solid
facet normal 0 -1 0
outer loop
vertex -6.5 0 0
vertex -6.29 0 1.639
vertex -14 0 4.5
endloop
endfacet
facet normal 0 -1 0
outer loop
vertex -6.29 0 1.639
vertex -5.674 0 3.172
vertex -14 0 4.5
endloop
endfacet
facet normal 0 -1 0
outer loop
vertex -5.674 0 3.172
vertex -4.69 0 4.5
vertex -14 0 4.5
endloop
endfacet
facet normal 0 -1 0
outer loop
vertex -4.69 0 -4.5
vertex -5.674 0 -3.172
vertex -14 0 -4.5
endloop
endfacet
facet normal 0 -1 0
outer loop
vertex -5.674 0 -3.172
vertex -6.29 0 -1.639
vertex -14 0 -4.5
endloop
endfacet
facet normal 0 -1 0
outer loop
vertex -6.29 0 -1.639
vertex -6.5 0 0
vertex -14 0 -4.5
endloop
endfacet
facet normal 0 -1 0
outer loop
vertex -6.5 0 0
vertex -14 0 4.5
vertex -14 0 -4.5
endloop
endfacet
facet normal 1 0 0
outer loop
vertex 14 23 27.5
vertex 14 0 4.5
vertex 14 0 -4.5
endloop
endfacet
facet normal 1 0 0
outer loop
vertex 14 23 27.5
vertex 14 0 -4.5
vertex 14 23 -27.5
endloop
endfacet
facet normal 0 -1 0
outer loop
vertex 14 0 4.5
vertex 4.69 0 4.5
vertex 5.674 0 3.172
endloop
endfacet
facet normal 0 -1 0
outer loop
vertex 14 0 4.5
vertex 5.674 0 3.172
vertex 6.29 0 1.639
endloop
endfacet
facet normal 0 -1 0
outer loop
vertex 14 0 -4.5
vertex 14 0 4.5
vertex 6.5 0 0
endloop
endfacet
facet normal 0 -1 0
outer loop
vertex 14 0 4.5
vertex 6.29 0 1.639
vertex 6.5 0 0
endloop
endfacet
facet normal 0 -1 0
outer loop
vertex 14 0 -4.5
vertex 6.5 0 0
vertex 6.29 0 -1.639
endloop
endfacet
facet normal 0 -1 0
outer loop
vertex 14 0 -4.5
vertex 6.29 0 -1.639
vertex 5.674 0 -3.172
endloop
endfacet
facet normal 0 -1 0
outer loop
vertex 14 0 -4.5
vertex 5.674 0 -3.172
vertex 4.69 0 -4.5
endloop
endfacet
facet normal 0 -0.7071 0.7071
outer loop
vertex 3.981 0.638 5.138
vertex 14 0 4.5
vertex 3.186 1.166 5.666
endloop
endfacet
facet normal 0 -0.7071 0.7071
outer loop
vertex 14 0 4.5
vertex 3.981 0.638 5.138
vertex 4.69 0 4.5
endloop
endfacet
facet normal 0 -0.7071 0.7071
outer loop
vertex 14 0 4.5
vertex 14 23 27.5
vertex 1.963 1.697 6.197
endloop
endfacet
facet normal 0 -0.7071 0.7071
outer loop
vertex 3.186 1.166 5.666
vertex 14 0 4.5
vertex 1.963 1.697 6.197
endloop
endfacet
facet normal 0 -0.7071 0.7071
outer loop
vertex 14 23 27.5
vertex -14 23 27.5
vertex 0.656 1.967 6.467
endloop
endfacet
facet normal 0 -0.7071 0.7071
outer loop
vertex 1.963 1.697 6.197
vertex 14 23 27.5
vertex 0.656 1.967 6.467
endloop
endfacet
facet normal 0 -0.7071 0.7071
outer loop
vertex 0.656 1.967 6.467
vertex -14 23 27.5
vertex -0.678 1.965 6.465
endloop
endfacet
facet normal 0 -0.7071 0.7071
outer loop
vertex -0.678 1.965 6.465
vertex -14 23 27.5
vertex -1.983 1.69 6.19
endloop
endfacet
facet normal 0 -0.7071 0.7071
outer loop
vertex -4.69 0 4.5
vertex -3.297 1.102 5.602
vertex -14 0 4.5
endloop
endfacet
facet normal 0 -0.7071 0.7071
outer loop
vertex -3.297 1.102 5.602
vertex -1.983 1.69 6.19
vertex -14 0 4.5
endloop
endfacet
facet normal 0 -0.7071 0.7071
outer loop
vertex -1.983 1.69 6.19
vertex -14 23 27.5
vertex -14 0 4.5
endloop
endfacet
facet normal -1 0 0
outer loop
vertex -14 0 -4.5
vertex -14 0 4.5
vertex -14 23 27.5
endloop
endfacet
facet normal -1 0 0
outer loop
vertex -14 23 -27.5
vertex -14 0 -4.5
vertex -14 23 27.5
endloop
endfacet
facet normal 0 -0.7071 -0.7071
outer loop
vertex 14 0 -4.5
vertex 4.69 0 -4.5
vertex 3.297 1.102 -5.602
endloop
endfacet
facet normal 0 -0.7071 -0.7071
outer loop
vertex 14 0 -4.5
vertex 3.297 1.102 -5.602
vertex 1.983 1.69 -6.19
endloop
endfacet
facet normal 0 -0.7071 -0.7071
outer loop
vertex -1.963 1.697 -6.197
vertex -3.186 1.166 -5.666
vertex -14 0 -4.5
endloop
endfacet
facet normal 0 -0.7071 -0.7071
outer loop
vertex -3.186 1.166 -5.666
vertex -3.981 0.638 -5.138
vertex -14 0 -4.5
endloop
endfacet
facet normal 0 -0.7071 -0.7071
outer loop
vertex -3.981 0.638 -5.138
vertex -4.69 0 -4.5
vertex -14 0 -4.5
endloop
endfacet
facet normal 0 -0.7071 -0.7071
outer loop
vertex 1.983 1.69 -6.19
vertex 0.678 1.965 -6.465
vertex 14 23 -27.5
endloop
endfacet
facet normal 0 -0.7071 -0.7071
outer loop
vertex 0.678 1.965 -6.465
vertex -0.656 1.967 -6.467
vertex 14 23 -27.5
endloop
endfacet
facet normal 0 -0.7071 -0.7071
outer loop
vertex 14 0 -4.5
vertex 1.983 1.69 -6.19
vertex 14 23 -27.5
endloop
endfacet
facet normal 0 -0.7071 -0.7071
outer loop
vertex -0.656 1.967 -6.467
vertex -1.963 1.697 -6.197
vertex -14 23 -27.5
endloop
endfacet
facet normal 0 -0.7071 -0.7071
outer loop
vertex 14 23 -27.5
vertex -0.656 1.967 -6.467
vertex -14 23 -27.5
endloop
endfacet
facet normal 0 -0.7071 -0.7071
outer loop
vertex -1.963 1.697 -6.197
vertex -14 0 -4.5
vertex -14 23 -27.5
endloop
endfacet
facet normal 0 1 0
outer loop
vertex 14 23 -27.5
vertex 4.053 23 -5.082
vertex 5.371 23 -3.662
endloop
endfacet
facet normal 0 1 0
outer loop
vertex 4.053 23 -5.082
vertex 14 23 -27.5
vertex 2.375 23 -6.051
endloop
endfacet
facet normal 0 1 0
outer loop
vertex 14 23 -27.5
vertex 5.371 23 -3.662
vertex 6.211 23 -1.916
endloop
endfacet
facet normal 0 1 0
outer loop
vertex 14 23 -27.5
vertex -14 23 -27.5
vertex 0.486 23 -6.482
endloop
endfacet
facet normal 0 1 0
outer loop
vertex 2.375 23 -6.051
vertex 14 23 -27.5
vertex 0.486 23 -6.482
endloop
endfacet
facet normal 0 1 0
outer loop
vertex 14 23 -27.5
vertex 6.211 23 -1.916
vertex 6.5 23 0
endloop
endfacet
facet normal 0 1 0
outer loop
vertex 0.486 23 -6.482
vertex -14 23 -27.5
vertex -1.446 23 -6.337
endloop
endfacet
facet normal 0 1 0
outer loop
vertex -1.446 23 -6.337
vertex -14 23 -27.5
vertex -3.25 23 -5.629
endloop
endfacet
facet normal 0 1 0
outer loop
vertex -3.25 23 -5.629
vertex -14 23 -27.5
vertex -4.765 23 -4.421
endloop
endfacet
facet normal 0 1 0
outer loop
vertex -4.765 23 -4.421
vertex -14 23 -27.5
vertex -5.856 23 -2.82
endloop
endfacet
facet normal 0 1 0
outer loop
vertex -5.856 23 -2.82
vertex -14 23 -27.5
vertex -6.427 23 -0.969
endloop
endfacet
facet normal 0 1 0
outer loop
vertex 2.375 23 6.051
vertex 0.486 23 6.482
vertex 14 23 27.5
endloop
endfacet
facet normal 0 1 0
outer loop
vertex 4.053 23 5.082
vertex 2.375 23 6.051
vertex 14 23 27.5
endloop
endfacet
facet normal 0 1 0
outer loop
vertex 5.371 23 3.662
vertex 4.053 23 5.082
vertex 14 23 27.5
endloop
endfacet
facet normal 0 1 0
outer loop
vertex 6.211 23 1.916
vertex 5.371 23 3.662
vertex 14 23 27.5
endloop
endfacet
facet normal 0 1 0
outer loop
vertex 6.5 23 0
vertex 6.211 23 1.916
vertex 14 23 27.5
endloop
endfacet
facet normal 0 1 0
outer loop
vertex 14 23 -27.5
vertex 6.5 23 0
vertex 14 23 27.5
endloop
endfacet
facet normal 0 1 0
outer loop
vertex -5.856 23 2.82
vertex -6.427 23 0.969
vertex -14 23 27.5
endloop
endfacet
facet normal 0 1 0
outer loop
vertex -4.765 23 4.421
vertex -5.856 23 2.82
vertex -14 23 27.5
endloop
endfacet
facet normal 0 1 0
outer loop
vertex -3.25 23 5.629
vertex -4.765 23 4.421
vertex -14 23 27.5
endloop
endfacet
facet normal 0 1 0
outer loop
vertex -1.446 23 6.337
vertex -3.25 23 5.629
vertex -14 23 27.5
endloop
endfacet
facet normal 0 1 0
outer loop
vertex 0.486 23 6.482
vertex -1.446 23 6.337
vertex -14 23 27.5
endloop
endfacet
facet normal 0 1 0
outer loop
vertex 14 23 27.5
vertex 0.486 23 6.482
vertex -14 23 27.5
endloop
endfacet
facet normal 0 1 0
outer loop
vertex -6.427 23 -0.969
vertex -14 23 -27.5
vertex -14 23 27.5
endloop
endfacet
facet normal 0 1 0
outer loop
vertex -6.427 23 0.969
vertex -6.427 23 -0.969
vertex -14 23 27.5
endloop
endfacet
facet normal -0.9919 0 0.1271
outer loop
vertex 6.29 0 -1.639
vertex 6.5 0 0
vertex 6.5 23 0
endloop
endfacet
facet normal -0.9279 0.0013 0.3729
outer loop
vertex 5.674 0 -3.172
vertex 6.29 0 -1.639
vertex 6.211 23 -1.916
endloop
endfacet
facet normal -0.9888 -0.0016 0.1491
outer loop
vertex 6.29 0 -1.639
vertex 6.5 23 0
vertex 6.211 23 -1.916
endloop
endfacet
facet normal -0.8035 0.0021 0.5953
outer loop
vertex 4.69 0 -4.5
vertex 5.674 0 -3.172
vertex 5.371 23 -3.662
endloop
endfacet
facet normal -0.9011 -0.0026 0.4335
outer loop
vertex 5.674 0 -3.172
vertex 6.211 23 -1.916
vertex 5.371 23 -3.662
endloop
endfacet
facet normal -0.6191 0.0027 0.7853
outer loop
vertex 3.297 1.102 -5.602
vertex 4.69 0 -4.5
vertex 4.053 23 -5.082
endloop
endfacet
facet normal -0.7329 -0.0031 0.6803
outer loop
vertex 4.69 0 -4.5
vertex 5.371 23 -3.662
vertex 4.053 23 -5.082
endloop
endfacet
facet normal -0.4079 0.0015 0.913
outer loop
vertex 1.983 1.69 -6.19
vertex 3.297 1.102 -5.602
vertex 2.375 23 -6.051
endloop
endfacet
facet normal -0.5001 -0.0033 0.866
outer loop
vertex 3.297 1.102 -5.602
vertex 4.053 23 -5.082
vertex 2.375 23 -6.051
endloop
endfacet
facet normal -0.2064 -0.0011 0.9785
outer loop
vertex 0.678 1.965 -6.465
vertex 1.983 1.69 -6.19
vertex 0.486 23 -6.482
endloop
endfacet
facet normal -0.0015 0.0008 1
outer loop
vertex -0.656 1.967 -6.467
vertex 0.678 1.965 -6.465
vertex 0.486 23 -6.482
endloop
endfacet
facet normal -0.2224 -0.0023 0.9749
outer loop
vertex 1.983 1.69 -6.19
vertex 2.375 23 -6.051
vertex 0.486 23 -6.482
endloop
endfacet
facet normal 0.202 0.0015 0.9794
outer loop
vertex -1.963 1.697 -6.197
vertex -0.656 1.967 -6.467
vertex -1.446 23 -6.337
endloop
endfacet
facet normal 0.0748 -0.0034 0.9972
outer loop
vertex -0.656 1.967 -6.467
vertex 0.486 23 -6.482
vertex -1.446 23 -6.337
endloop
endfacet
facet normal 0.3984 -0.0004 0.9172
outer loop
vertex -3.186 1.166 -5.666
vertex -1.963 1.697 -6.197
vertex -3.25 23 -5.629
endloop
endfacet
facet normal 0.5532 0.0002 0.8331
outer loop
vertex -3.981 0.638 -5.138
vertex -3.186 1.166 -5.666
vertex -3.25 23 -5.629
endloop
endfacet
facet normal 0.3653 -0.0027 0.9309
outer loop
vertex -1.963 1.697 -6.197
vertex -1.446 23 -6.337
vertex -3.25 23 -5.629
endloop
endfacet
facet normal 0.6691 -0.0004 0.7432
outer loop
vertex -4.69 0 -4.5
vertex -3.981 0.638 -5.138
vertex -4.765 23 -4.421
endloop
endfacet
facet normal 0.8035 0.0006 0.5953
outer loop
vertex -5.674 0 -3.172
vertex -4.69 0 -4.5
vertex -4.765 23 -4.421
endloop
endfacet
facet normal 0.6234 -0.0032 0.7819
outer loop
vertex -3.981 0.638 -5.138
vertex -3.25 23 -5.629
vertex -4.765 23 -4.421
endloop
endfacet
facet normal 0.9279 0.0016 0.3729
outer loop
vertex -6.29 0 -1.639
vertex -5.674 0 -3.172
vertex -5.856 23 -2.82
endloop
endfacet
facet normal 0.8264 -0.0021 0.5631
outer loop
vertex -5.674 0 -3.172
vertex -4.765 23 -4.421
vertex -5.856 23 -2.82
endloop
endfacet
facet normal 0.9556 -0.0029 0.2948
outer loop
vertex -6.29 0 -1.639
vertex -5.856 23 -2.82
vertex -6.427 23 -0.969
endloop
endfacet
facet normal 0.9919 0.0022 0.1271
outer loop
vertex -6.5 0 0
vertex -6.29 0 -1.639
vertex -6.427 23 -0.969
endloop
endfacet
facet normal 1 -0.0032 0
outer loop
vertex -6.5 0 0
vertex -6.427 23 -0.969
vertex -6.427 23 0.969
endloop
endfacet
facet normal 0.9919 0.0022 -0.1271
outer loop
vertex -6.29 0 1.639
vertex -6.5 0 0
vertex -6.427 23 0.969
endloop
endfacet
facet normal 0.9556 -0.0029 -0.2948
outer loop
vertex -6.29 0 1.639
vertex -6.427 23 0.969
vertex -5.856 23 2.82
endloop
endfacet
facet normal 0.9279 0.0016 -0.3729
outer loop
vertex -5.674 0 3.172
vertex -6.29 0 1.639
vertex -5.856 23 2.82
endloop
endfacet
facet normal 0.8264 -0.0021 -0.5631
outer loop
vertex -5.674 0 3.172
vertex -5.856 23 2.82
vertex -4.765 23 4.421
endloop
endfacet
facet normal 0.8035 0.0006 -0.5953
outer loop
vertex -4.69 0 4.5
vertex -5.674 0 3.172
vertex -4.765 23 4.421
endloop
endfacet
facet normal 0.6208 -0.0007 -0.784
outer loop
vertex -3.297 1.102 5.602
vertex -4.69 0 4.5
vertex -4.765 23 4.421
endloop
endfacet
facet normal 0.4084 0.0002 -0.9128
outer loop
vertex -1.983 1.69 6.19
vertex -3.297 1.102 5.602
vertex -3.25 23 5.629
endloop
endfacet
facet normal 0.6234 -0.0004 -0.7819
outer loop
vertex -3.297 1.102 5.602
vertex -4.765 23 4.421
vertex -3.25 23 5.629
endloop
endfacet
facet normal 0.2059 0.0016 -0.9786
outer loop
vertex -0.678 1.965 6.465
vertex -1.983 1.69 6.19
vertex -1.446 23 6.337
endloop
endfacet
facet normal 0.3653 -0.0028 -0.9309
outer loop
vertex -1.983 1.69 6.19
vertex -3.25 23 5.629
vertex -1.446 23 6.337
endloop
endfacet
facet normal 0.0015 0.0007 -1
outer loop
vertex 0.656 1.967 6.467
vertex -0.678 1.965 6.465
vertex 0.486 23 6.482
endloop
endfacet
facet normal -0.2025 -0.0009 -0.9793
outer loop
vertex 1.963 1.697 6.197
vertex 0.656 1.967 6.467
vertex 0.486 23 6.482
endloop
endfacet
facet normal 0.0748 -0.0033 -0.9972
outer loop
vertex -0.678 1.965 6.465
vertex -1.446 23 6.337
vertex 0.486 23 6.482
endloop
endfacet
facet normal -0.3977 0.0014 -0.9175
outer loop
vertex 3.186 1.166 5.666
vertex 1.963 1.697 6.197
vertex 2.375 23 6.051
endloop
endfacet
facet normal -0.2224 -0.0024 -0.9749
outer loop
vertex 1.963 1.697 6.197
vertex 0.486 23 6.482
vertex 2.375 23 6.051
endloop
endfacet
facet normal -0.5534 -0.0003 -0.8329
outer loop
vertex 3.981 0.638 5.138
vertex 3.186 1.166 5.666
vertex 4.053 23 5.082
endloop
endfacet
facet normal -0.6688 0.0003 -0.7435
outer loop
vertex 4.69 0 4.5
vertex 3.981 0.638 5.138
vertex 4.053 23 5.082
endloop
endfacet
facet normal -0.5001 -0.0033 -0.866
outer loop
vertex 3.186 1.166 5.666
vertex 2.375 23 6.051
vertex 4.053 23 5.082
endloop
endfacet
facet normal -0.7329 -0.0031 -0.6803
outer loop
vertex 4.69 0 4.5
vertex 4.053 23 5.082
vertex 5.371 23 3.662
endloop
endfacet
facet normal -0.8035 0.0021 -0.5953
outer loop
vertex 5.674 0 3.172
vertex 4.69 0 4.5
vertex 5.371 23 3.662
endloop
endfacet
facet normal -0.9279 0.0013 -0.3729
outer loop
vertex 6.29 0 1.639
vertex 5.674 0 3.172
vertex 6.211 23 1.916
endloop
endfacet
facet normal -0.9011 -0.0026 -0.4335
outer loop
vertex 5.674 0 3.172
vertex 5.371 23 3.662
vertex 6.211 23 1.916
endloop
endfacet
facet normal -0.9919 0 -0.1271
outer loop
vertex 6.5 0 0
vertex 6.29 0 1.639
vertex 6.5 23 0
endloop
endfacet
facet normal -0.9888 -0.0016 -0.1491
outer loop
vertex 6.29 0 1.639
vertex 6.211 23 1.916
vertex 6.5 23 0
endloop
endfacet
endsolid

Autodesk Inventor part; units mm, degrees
ref_plane "YZ Plane" through (0, 0, 0) normal (1, 0, 0) x (0, 1, 0)
ref_plane "XZ Plane" through (0, 0, 0) normal (0, 1, 0) x (-1, 0, 0)
ref_plane "XY Plane" through (0, 0, 0) normal (0, 0, 1) x (1, 0, 0)
sketch "Sketch1" plane through (0, 0, 0) normal (1, 0, 0) x (0, 1, 0)
  line L0 (0, 4.5) -> (0, -4.5)
  line L1 (0, -4.5) -> (23, -27.5)
  line L2 (23, -27.5) -> (23, 27.5)
  line L3 (23, 27.5) -> (0, 4.5)
  point P0 (0, 0)
  point P1 (0, 0)
  point P2 (23, 0)
  dimension "d0" = 45
  dimension "d1" = 55
  dimension "d2" = 23
extrude "Extrusion1" add sketch "Sketch1" along normal mid plane 28
sketch "Sketch2" plane through (-14, 23, 27.5) normal (0, 1, 0) x (1, 0, 0)
  circle A0 centre (14, 27.5) radius 6.5
  dimension "d5" = 13
extrude "Extrusion2" cut sketch "Sketch2" against normal through all
properties part number "buttom_camera_fix"
